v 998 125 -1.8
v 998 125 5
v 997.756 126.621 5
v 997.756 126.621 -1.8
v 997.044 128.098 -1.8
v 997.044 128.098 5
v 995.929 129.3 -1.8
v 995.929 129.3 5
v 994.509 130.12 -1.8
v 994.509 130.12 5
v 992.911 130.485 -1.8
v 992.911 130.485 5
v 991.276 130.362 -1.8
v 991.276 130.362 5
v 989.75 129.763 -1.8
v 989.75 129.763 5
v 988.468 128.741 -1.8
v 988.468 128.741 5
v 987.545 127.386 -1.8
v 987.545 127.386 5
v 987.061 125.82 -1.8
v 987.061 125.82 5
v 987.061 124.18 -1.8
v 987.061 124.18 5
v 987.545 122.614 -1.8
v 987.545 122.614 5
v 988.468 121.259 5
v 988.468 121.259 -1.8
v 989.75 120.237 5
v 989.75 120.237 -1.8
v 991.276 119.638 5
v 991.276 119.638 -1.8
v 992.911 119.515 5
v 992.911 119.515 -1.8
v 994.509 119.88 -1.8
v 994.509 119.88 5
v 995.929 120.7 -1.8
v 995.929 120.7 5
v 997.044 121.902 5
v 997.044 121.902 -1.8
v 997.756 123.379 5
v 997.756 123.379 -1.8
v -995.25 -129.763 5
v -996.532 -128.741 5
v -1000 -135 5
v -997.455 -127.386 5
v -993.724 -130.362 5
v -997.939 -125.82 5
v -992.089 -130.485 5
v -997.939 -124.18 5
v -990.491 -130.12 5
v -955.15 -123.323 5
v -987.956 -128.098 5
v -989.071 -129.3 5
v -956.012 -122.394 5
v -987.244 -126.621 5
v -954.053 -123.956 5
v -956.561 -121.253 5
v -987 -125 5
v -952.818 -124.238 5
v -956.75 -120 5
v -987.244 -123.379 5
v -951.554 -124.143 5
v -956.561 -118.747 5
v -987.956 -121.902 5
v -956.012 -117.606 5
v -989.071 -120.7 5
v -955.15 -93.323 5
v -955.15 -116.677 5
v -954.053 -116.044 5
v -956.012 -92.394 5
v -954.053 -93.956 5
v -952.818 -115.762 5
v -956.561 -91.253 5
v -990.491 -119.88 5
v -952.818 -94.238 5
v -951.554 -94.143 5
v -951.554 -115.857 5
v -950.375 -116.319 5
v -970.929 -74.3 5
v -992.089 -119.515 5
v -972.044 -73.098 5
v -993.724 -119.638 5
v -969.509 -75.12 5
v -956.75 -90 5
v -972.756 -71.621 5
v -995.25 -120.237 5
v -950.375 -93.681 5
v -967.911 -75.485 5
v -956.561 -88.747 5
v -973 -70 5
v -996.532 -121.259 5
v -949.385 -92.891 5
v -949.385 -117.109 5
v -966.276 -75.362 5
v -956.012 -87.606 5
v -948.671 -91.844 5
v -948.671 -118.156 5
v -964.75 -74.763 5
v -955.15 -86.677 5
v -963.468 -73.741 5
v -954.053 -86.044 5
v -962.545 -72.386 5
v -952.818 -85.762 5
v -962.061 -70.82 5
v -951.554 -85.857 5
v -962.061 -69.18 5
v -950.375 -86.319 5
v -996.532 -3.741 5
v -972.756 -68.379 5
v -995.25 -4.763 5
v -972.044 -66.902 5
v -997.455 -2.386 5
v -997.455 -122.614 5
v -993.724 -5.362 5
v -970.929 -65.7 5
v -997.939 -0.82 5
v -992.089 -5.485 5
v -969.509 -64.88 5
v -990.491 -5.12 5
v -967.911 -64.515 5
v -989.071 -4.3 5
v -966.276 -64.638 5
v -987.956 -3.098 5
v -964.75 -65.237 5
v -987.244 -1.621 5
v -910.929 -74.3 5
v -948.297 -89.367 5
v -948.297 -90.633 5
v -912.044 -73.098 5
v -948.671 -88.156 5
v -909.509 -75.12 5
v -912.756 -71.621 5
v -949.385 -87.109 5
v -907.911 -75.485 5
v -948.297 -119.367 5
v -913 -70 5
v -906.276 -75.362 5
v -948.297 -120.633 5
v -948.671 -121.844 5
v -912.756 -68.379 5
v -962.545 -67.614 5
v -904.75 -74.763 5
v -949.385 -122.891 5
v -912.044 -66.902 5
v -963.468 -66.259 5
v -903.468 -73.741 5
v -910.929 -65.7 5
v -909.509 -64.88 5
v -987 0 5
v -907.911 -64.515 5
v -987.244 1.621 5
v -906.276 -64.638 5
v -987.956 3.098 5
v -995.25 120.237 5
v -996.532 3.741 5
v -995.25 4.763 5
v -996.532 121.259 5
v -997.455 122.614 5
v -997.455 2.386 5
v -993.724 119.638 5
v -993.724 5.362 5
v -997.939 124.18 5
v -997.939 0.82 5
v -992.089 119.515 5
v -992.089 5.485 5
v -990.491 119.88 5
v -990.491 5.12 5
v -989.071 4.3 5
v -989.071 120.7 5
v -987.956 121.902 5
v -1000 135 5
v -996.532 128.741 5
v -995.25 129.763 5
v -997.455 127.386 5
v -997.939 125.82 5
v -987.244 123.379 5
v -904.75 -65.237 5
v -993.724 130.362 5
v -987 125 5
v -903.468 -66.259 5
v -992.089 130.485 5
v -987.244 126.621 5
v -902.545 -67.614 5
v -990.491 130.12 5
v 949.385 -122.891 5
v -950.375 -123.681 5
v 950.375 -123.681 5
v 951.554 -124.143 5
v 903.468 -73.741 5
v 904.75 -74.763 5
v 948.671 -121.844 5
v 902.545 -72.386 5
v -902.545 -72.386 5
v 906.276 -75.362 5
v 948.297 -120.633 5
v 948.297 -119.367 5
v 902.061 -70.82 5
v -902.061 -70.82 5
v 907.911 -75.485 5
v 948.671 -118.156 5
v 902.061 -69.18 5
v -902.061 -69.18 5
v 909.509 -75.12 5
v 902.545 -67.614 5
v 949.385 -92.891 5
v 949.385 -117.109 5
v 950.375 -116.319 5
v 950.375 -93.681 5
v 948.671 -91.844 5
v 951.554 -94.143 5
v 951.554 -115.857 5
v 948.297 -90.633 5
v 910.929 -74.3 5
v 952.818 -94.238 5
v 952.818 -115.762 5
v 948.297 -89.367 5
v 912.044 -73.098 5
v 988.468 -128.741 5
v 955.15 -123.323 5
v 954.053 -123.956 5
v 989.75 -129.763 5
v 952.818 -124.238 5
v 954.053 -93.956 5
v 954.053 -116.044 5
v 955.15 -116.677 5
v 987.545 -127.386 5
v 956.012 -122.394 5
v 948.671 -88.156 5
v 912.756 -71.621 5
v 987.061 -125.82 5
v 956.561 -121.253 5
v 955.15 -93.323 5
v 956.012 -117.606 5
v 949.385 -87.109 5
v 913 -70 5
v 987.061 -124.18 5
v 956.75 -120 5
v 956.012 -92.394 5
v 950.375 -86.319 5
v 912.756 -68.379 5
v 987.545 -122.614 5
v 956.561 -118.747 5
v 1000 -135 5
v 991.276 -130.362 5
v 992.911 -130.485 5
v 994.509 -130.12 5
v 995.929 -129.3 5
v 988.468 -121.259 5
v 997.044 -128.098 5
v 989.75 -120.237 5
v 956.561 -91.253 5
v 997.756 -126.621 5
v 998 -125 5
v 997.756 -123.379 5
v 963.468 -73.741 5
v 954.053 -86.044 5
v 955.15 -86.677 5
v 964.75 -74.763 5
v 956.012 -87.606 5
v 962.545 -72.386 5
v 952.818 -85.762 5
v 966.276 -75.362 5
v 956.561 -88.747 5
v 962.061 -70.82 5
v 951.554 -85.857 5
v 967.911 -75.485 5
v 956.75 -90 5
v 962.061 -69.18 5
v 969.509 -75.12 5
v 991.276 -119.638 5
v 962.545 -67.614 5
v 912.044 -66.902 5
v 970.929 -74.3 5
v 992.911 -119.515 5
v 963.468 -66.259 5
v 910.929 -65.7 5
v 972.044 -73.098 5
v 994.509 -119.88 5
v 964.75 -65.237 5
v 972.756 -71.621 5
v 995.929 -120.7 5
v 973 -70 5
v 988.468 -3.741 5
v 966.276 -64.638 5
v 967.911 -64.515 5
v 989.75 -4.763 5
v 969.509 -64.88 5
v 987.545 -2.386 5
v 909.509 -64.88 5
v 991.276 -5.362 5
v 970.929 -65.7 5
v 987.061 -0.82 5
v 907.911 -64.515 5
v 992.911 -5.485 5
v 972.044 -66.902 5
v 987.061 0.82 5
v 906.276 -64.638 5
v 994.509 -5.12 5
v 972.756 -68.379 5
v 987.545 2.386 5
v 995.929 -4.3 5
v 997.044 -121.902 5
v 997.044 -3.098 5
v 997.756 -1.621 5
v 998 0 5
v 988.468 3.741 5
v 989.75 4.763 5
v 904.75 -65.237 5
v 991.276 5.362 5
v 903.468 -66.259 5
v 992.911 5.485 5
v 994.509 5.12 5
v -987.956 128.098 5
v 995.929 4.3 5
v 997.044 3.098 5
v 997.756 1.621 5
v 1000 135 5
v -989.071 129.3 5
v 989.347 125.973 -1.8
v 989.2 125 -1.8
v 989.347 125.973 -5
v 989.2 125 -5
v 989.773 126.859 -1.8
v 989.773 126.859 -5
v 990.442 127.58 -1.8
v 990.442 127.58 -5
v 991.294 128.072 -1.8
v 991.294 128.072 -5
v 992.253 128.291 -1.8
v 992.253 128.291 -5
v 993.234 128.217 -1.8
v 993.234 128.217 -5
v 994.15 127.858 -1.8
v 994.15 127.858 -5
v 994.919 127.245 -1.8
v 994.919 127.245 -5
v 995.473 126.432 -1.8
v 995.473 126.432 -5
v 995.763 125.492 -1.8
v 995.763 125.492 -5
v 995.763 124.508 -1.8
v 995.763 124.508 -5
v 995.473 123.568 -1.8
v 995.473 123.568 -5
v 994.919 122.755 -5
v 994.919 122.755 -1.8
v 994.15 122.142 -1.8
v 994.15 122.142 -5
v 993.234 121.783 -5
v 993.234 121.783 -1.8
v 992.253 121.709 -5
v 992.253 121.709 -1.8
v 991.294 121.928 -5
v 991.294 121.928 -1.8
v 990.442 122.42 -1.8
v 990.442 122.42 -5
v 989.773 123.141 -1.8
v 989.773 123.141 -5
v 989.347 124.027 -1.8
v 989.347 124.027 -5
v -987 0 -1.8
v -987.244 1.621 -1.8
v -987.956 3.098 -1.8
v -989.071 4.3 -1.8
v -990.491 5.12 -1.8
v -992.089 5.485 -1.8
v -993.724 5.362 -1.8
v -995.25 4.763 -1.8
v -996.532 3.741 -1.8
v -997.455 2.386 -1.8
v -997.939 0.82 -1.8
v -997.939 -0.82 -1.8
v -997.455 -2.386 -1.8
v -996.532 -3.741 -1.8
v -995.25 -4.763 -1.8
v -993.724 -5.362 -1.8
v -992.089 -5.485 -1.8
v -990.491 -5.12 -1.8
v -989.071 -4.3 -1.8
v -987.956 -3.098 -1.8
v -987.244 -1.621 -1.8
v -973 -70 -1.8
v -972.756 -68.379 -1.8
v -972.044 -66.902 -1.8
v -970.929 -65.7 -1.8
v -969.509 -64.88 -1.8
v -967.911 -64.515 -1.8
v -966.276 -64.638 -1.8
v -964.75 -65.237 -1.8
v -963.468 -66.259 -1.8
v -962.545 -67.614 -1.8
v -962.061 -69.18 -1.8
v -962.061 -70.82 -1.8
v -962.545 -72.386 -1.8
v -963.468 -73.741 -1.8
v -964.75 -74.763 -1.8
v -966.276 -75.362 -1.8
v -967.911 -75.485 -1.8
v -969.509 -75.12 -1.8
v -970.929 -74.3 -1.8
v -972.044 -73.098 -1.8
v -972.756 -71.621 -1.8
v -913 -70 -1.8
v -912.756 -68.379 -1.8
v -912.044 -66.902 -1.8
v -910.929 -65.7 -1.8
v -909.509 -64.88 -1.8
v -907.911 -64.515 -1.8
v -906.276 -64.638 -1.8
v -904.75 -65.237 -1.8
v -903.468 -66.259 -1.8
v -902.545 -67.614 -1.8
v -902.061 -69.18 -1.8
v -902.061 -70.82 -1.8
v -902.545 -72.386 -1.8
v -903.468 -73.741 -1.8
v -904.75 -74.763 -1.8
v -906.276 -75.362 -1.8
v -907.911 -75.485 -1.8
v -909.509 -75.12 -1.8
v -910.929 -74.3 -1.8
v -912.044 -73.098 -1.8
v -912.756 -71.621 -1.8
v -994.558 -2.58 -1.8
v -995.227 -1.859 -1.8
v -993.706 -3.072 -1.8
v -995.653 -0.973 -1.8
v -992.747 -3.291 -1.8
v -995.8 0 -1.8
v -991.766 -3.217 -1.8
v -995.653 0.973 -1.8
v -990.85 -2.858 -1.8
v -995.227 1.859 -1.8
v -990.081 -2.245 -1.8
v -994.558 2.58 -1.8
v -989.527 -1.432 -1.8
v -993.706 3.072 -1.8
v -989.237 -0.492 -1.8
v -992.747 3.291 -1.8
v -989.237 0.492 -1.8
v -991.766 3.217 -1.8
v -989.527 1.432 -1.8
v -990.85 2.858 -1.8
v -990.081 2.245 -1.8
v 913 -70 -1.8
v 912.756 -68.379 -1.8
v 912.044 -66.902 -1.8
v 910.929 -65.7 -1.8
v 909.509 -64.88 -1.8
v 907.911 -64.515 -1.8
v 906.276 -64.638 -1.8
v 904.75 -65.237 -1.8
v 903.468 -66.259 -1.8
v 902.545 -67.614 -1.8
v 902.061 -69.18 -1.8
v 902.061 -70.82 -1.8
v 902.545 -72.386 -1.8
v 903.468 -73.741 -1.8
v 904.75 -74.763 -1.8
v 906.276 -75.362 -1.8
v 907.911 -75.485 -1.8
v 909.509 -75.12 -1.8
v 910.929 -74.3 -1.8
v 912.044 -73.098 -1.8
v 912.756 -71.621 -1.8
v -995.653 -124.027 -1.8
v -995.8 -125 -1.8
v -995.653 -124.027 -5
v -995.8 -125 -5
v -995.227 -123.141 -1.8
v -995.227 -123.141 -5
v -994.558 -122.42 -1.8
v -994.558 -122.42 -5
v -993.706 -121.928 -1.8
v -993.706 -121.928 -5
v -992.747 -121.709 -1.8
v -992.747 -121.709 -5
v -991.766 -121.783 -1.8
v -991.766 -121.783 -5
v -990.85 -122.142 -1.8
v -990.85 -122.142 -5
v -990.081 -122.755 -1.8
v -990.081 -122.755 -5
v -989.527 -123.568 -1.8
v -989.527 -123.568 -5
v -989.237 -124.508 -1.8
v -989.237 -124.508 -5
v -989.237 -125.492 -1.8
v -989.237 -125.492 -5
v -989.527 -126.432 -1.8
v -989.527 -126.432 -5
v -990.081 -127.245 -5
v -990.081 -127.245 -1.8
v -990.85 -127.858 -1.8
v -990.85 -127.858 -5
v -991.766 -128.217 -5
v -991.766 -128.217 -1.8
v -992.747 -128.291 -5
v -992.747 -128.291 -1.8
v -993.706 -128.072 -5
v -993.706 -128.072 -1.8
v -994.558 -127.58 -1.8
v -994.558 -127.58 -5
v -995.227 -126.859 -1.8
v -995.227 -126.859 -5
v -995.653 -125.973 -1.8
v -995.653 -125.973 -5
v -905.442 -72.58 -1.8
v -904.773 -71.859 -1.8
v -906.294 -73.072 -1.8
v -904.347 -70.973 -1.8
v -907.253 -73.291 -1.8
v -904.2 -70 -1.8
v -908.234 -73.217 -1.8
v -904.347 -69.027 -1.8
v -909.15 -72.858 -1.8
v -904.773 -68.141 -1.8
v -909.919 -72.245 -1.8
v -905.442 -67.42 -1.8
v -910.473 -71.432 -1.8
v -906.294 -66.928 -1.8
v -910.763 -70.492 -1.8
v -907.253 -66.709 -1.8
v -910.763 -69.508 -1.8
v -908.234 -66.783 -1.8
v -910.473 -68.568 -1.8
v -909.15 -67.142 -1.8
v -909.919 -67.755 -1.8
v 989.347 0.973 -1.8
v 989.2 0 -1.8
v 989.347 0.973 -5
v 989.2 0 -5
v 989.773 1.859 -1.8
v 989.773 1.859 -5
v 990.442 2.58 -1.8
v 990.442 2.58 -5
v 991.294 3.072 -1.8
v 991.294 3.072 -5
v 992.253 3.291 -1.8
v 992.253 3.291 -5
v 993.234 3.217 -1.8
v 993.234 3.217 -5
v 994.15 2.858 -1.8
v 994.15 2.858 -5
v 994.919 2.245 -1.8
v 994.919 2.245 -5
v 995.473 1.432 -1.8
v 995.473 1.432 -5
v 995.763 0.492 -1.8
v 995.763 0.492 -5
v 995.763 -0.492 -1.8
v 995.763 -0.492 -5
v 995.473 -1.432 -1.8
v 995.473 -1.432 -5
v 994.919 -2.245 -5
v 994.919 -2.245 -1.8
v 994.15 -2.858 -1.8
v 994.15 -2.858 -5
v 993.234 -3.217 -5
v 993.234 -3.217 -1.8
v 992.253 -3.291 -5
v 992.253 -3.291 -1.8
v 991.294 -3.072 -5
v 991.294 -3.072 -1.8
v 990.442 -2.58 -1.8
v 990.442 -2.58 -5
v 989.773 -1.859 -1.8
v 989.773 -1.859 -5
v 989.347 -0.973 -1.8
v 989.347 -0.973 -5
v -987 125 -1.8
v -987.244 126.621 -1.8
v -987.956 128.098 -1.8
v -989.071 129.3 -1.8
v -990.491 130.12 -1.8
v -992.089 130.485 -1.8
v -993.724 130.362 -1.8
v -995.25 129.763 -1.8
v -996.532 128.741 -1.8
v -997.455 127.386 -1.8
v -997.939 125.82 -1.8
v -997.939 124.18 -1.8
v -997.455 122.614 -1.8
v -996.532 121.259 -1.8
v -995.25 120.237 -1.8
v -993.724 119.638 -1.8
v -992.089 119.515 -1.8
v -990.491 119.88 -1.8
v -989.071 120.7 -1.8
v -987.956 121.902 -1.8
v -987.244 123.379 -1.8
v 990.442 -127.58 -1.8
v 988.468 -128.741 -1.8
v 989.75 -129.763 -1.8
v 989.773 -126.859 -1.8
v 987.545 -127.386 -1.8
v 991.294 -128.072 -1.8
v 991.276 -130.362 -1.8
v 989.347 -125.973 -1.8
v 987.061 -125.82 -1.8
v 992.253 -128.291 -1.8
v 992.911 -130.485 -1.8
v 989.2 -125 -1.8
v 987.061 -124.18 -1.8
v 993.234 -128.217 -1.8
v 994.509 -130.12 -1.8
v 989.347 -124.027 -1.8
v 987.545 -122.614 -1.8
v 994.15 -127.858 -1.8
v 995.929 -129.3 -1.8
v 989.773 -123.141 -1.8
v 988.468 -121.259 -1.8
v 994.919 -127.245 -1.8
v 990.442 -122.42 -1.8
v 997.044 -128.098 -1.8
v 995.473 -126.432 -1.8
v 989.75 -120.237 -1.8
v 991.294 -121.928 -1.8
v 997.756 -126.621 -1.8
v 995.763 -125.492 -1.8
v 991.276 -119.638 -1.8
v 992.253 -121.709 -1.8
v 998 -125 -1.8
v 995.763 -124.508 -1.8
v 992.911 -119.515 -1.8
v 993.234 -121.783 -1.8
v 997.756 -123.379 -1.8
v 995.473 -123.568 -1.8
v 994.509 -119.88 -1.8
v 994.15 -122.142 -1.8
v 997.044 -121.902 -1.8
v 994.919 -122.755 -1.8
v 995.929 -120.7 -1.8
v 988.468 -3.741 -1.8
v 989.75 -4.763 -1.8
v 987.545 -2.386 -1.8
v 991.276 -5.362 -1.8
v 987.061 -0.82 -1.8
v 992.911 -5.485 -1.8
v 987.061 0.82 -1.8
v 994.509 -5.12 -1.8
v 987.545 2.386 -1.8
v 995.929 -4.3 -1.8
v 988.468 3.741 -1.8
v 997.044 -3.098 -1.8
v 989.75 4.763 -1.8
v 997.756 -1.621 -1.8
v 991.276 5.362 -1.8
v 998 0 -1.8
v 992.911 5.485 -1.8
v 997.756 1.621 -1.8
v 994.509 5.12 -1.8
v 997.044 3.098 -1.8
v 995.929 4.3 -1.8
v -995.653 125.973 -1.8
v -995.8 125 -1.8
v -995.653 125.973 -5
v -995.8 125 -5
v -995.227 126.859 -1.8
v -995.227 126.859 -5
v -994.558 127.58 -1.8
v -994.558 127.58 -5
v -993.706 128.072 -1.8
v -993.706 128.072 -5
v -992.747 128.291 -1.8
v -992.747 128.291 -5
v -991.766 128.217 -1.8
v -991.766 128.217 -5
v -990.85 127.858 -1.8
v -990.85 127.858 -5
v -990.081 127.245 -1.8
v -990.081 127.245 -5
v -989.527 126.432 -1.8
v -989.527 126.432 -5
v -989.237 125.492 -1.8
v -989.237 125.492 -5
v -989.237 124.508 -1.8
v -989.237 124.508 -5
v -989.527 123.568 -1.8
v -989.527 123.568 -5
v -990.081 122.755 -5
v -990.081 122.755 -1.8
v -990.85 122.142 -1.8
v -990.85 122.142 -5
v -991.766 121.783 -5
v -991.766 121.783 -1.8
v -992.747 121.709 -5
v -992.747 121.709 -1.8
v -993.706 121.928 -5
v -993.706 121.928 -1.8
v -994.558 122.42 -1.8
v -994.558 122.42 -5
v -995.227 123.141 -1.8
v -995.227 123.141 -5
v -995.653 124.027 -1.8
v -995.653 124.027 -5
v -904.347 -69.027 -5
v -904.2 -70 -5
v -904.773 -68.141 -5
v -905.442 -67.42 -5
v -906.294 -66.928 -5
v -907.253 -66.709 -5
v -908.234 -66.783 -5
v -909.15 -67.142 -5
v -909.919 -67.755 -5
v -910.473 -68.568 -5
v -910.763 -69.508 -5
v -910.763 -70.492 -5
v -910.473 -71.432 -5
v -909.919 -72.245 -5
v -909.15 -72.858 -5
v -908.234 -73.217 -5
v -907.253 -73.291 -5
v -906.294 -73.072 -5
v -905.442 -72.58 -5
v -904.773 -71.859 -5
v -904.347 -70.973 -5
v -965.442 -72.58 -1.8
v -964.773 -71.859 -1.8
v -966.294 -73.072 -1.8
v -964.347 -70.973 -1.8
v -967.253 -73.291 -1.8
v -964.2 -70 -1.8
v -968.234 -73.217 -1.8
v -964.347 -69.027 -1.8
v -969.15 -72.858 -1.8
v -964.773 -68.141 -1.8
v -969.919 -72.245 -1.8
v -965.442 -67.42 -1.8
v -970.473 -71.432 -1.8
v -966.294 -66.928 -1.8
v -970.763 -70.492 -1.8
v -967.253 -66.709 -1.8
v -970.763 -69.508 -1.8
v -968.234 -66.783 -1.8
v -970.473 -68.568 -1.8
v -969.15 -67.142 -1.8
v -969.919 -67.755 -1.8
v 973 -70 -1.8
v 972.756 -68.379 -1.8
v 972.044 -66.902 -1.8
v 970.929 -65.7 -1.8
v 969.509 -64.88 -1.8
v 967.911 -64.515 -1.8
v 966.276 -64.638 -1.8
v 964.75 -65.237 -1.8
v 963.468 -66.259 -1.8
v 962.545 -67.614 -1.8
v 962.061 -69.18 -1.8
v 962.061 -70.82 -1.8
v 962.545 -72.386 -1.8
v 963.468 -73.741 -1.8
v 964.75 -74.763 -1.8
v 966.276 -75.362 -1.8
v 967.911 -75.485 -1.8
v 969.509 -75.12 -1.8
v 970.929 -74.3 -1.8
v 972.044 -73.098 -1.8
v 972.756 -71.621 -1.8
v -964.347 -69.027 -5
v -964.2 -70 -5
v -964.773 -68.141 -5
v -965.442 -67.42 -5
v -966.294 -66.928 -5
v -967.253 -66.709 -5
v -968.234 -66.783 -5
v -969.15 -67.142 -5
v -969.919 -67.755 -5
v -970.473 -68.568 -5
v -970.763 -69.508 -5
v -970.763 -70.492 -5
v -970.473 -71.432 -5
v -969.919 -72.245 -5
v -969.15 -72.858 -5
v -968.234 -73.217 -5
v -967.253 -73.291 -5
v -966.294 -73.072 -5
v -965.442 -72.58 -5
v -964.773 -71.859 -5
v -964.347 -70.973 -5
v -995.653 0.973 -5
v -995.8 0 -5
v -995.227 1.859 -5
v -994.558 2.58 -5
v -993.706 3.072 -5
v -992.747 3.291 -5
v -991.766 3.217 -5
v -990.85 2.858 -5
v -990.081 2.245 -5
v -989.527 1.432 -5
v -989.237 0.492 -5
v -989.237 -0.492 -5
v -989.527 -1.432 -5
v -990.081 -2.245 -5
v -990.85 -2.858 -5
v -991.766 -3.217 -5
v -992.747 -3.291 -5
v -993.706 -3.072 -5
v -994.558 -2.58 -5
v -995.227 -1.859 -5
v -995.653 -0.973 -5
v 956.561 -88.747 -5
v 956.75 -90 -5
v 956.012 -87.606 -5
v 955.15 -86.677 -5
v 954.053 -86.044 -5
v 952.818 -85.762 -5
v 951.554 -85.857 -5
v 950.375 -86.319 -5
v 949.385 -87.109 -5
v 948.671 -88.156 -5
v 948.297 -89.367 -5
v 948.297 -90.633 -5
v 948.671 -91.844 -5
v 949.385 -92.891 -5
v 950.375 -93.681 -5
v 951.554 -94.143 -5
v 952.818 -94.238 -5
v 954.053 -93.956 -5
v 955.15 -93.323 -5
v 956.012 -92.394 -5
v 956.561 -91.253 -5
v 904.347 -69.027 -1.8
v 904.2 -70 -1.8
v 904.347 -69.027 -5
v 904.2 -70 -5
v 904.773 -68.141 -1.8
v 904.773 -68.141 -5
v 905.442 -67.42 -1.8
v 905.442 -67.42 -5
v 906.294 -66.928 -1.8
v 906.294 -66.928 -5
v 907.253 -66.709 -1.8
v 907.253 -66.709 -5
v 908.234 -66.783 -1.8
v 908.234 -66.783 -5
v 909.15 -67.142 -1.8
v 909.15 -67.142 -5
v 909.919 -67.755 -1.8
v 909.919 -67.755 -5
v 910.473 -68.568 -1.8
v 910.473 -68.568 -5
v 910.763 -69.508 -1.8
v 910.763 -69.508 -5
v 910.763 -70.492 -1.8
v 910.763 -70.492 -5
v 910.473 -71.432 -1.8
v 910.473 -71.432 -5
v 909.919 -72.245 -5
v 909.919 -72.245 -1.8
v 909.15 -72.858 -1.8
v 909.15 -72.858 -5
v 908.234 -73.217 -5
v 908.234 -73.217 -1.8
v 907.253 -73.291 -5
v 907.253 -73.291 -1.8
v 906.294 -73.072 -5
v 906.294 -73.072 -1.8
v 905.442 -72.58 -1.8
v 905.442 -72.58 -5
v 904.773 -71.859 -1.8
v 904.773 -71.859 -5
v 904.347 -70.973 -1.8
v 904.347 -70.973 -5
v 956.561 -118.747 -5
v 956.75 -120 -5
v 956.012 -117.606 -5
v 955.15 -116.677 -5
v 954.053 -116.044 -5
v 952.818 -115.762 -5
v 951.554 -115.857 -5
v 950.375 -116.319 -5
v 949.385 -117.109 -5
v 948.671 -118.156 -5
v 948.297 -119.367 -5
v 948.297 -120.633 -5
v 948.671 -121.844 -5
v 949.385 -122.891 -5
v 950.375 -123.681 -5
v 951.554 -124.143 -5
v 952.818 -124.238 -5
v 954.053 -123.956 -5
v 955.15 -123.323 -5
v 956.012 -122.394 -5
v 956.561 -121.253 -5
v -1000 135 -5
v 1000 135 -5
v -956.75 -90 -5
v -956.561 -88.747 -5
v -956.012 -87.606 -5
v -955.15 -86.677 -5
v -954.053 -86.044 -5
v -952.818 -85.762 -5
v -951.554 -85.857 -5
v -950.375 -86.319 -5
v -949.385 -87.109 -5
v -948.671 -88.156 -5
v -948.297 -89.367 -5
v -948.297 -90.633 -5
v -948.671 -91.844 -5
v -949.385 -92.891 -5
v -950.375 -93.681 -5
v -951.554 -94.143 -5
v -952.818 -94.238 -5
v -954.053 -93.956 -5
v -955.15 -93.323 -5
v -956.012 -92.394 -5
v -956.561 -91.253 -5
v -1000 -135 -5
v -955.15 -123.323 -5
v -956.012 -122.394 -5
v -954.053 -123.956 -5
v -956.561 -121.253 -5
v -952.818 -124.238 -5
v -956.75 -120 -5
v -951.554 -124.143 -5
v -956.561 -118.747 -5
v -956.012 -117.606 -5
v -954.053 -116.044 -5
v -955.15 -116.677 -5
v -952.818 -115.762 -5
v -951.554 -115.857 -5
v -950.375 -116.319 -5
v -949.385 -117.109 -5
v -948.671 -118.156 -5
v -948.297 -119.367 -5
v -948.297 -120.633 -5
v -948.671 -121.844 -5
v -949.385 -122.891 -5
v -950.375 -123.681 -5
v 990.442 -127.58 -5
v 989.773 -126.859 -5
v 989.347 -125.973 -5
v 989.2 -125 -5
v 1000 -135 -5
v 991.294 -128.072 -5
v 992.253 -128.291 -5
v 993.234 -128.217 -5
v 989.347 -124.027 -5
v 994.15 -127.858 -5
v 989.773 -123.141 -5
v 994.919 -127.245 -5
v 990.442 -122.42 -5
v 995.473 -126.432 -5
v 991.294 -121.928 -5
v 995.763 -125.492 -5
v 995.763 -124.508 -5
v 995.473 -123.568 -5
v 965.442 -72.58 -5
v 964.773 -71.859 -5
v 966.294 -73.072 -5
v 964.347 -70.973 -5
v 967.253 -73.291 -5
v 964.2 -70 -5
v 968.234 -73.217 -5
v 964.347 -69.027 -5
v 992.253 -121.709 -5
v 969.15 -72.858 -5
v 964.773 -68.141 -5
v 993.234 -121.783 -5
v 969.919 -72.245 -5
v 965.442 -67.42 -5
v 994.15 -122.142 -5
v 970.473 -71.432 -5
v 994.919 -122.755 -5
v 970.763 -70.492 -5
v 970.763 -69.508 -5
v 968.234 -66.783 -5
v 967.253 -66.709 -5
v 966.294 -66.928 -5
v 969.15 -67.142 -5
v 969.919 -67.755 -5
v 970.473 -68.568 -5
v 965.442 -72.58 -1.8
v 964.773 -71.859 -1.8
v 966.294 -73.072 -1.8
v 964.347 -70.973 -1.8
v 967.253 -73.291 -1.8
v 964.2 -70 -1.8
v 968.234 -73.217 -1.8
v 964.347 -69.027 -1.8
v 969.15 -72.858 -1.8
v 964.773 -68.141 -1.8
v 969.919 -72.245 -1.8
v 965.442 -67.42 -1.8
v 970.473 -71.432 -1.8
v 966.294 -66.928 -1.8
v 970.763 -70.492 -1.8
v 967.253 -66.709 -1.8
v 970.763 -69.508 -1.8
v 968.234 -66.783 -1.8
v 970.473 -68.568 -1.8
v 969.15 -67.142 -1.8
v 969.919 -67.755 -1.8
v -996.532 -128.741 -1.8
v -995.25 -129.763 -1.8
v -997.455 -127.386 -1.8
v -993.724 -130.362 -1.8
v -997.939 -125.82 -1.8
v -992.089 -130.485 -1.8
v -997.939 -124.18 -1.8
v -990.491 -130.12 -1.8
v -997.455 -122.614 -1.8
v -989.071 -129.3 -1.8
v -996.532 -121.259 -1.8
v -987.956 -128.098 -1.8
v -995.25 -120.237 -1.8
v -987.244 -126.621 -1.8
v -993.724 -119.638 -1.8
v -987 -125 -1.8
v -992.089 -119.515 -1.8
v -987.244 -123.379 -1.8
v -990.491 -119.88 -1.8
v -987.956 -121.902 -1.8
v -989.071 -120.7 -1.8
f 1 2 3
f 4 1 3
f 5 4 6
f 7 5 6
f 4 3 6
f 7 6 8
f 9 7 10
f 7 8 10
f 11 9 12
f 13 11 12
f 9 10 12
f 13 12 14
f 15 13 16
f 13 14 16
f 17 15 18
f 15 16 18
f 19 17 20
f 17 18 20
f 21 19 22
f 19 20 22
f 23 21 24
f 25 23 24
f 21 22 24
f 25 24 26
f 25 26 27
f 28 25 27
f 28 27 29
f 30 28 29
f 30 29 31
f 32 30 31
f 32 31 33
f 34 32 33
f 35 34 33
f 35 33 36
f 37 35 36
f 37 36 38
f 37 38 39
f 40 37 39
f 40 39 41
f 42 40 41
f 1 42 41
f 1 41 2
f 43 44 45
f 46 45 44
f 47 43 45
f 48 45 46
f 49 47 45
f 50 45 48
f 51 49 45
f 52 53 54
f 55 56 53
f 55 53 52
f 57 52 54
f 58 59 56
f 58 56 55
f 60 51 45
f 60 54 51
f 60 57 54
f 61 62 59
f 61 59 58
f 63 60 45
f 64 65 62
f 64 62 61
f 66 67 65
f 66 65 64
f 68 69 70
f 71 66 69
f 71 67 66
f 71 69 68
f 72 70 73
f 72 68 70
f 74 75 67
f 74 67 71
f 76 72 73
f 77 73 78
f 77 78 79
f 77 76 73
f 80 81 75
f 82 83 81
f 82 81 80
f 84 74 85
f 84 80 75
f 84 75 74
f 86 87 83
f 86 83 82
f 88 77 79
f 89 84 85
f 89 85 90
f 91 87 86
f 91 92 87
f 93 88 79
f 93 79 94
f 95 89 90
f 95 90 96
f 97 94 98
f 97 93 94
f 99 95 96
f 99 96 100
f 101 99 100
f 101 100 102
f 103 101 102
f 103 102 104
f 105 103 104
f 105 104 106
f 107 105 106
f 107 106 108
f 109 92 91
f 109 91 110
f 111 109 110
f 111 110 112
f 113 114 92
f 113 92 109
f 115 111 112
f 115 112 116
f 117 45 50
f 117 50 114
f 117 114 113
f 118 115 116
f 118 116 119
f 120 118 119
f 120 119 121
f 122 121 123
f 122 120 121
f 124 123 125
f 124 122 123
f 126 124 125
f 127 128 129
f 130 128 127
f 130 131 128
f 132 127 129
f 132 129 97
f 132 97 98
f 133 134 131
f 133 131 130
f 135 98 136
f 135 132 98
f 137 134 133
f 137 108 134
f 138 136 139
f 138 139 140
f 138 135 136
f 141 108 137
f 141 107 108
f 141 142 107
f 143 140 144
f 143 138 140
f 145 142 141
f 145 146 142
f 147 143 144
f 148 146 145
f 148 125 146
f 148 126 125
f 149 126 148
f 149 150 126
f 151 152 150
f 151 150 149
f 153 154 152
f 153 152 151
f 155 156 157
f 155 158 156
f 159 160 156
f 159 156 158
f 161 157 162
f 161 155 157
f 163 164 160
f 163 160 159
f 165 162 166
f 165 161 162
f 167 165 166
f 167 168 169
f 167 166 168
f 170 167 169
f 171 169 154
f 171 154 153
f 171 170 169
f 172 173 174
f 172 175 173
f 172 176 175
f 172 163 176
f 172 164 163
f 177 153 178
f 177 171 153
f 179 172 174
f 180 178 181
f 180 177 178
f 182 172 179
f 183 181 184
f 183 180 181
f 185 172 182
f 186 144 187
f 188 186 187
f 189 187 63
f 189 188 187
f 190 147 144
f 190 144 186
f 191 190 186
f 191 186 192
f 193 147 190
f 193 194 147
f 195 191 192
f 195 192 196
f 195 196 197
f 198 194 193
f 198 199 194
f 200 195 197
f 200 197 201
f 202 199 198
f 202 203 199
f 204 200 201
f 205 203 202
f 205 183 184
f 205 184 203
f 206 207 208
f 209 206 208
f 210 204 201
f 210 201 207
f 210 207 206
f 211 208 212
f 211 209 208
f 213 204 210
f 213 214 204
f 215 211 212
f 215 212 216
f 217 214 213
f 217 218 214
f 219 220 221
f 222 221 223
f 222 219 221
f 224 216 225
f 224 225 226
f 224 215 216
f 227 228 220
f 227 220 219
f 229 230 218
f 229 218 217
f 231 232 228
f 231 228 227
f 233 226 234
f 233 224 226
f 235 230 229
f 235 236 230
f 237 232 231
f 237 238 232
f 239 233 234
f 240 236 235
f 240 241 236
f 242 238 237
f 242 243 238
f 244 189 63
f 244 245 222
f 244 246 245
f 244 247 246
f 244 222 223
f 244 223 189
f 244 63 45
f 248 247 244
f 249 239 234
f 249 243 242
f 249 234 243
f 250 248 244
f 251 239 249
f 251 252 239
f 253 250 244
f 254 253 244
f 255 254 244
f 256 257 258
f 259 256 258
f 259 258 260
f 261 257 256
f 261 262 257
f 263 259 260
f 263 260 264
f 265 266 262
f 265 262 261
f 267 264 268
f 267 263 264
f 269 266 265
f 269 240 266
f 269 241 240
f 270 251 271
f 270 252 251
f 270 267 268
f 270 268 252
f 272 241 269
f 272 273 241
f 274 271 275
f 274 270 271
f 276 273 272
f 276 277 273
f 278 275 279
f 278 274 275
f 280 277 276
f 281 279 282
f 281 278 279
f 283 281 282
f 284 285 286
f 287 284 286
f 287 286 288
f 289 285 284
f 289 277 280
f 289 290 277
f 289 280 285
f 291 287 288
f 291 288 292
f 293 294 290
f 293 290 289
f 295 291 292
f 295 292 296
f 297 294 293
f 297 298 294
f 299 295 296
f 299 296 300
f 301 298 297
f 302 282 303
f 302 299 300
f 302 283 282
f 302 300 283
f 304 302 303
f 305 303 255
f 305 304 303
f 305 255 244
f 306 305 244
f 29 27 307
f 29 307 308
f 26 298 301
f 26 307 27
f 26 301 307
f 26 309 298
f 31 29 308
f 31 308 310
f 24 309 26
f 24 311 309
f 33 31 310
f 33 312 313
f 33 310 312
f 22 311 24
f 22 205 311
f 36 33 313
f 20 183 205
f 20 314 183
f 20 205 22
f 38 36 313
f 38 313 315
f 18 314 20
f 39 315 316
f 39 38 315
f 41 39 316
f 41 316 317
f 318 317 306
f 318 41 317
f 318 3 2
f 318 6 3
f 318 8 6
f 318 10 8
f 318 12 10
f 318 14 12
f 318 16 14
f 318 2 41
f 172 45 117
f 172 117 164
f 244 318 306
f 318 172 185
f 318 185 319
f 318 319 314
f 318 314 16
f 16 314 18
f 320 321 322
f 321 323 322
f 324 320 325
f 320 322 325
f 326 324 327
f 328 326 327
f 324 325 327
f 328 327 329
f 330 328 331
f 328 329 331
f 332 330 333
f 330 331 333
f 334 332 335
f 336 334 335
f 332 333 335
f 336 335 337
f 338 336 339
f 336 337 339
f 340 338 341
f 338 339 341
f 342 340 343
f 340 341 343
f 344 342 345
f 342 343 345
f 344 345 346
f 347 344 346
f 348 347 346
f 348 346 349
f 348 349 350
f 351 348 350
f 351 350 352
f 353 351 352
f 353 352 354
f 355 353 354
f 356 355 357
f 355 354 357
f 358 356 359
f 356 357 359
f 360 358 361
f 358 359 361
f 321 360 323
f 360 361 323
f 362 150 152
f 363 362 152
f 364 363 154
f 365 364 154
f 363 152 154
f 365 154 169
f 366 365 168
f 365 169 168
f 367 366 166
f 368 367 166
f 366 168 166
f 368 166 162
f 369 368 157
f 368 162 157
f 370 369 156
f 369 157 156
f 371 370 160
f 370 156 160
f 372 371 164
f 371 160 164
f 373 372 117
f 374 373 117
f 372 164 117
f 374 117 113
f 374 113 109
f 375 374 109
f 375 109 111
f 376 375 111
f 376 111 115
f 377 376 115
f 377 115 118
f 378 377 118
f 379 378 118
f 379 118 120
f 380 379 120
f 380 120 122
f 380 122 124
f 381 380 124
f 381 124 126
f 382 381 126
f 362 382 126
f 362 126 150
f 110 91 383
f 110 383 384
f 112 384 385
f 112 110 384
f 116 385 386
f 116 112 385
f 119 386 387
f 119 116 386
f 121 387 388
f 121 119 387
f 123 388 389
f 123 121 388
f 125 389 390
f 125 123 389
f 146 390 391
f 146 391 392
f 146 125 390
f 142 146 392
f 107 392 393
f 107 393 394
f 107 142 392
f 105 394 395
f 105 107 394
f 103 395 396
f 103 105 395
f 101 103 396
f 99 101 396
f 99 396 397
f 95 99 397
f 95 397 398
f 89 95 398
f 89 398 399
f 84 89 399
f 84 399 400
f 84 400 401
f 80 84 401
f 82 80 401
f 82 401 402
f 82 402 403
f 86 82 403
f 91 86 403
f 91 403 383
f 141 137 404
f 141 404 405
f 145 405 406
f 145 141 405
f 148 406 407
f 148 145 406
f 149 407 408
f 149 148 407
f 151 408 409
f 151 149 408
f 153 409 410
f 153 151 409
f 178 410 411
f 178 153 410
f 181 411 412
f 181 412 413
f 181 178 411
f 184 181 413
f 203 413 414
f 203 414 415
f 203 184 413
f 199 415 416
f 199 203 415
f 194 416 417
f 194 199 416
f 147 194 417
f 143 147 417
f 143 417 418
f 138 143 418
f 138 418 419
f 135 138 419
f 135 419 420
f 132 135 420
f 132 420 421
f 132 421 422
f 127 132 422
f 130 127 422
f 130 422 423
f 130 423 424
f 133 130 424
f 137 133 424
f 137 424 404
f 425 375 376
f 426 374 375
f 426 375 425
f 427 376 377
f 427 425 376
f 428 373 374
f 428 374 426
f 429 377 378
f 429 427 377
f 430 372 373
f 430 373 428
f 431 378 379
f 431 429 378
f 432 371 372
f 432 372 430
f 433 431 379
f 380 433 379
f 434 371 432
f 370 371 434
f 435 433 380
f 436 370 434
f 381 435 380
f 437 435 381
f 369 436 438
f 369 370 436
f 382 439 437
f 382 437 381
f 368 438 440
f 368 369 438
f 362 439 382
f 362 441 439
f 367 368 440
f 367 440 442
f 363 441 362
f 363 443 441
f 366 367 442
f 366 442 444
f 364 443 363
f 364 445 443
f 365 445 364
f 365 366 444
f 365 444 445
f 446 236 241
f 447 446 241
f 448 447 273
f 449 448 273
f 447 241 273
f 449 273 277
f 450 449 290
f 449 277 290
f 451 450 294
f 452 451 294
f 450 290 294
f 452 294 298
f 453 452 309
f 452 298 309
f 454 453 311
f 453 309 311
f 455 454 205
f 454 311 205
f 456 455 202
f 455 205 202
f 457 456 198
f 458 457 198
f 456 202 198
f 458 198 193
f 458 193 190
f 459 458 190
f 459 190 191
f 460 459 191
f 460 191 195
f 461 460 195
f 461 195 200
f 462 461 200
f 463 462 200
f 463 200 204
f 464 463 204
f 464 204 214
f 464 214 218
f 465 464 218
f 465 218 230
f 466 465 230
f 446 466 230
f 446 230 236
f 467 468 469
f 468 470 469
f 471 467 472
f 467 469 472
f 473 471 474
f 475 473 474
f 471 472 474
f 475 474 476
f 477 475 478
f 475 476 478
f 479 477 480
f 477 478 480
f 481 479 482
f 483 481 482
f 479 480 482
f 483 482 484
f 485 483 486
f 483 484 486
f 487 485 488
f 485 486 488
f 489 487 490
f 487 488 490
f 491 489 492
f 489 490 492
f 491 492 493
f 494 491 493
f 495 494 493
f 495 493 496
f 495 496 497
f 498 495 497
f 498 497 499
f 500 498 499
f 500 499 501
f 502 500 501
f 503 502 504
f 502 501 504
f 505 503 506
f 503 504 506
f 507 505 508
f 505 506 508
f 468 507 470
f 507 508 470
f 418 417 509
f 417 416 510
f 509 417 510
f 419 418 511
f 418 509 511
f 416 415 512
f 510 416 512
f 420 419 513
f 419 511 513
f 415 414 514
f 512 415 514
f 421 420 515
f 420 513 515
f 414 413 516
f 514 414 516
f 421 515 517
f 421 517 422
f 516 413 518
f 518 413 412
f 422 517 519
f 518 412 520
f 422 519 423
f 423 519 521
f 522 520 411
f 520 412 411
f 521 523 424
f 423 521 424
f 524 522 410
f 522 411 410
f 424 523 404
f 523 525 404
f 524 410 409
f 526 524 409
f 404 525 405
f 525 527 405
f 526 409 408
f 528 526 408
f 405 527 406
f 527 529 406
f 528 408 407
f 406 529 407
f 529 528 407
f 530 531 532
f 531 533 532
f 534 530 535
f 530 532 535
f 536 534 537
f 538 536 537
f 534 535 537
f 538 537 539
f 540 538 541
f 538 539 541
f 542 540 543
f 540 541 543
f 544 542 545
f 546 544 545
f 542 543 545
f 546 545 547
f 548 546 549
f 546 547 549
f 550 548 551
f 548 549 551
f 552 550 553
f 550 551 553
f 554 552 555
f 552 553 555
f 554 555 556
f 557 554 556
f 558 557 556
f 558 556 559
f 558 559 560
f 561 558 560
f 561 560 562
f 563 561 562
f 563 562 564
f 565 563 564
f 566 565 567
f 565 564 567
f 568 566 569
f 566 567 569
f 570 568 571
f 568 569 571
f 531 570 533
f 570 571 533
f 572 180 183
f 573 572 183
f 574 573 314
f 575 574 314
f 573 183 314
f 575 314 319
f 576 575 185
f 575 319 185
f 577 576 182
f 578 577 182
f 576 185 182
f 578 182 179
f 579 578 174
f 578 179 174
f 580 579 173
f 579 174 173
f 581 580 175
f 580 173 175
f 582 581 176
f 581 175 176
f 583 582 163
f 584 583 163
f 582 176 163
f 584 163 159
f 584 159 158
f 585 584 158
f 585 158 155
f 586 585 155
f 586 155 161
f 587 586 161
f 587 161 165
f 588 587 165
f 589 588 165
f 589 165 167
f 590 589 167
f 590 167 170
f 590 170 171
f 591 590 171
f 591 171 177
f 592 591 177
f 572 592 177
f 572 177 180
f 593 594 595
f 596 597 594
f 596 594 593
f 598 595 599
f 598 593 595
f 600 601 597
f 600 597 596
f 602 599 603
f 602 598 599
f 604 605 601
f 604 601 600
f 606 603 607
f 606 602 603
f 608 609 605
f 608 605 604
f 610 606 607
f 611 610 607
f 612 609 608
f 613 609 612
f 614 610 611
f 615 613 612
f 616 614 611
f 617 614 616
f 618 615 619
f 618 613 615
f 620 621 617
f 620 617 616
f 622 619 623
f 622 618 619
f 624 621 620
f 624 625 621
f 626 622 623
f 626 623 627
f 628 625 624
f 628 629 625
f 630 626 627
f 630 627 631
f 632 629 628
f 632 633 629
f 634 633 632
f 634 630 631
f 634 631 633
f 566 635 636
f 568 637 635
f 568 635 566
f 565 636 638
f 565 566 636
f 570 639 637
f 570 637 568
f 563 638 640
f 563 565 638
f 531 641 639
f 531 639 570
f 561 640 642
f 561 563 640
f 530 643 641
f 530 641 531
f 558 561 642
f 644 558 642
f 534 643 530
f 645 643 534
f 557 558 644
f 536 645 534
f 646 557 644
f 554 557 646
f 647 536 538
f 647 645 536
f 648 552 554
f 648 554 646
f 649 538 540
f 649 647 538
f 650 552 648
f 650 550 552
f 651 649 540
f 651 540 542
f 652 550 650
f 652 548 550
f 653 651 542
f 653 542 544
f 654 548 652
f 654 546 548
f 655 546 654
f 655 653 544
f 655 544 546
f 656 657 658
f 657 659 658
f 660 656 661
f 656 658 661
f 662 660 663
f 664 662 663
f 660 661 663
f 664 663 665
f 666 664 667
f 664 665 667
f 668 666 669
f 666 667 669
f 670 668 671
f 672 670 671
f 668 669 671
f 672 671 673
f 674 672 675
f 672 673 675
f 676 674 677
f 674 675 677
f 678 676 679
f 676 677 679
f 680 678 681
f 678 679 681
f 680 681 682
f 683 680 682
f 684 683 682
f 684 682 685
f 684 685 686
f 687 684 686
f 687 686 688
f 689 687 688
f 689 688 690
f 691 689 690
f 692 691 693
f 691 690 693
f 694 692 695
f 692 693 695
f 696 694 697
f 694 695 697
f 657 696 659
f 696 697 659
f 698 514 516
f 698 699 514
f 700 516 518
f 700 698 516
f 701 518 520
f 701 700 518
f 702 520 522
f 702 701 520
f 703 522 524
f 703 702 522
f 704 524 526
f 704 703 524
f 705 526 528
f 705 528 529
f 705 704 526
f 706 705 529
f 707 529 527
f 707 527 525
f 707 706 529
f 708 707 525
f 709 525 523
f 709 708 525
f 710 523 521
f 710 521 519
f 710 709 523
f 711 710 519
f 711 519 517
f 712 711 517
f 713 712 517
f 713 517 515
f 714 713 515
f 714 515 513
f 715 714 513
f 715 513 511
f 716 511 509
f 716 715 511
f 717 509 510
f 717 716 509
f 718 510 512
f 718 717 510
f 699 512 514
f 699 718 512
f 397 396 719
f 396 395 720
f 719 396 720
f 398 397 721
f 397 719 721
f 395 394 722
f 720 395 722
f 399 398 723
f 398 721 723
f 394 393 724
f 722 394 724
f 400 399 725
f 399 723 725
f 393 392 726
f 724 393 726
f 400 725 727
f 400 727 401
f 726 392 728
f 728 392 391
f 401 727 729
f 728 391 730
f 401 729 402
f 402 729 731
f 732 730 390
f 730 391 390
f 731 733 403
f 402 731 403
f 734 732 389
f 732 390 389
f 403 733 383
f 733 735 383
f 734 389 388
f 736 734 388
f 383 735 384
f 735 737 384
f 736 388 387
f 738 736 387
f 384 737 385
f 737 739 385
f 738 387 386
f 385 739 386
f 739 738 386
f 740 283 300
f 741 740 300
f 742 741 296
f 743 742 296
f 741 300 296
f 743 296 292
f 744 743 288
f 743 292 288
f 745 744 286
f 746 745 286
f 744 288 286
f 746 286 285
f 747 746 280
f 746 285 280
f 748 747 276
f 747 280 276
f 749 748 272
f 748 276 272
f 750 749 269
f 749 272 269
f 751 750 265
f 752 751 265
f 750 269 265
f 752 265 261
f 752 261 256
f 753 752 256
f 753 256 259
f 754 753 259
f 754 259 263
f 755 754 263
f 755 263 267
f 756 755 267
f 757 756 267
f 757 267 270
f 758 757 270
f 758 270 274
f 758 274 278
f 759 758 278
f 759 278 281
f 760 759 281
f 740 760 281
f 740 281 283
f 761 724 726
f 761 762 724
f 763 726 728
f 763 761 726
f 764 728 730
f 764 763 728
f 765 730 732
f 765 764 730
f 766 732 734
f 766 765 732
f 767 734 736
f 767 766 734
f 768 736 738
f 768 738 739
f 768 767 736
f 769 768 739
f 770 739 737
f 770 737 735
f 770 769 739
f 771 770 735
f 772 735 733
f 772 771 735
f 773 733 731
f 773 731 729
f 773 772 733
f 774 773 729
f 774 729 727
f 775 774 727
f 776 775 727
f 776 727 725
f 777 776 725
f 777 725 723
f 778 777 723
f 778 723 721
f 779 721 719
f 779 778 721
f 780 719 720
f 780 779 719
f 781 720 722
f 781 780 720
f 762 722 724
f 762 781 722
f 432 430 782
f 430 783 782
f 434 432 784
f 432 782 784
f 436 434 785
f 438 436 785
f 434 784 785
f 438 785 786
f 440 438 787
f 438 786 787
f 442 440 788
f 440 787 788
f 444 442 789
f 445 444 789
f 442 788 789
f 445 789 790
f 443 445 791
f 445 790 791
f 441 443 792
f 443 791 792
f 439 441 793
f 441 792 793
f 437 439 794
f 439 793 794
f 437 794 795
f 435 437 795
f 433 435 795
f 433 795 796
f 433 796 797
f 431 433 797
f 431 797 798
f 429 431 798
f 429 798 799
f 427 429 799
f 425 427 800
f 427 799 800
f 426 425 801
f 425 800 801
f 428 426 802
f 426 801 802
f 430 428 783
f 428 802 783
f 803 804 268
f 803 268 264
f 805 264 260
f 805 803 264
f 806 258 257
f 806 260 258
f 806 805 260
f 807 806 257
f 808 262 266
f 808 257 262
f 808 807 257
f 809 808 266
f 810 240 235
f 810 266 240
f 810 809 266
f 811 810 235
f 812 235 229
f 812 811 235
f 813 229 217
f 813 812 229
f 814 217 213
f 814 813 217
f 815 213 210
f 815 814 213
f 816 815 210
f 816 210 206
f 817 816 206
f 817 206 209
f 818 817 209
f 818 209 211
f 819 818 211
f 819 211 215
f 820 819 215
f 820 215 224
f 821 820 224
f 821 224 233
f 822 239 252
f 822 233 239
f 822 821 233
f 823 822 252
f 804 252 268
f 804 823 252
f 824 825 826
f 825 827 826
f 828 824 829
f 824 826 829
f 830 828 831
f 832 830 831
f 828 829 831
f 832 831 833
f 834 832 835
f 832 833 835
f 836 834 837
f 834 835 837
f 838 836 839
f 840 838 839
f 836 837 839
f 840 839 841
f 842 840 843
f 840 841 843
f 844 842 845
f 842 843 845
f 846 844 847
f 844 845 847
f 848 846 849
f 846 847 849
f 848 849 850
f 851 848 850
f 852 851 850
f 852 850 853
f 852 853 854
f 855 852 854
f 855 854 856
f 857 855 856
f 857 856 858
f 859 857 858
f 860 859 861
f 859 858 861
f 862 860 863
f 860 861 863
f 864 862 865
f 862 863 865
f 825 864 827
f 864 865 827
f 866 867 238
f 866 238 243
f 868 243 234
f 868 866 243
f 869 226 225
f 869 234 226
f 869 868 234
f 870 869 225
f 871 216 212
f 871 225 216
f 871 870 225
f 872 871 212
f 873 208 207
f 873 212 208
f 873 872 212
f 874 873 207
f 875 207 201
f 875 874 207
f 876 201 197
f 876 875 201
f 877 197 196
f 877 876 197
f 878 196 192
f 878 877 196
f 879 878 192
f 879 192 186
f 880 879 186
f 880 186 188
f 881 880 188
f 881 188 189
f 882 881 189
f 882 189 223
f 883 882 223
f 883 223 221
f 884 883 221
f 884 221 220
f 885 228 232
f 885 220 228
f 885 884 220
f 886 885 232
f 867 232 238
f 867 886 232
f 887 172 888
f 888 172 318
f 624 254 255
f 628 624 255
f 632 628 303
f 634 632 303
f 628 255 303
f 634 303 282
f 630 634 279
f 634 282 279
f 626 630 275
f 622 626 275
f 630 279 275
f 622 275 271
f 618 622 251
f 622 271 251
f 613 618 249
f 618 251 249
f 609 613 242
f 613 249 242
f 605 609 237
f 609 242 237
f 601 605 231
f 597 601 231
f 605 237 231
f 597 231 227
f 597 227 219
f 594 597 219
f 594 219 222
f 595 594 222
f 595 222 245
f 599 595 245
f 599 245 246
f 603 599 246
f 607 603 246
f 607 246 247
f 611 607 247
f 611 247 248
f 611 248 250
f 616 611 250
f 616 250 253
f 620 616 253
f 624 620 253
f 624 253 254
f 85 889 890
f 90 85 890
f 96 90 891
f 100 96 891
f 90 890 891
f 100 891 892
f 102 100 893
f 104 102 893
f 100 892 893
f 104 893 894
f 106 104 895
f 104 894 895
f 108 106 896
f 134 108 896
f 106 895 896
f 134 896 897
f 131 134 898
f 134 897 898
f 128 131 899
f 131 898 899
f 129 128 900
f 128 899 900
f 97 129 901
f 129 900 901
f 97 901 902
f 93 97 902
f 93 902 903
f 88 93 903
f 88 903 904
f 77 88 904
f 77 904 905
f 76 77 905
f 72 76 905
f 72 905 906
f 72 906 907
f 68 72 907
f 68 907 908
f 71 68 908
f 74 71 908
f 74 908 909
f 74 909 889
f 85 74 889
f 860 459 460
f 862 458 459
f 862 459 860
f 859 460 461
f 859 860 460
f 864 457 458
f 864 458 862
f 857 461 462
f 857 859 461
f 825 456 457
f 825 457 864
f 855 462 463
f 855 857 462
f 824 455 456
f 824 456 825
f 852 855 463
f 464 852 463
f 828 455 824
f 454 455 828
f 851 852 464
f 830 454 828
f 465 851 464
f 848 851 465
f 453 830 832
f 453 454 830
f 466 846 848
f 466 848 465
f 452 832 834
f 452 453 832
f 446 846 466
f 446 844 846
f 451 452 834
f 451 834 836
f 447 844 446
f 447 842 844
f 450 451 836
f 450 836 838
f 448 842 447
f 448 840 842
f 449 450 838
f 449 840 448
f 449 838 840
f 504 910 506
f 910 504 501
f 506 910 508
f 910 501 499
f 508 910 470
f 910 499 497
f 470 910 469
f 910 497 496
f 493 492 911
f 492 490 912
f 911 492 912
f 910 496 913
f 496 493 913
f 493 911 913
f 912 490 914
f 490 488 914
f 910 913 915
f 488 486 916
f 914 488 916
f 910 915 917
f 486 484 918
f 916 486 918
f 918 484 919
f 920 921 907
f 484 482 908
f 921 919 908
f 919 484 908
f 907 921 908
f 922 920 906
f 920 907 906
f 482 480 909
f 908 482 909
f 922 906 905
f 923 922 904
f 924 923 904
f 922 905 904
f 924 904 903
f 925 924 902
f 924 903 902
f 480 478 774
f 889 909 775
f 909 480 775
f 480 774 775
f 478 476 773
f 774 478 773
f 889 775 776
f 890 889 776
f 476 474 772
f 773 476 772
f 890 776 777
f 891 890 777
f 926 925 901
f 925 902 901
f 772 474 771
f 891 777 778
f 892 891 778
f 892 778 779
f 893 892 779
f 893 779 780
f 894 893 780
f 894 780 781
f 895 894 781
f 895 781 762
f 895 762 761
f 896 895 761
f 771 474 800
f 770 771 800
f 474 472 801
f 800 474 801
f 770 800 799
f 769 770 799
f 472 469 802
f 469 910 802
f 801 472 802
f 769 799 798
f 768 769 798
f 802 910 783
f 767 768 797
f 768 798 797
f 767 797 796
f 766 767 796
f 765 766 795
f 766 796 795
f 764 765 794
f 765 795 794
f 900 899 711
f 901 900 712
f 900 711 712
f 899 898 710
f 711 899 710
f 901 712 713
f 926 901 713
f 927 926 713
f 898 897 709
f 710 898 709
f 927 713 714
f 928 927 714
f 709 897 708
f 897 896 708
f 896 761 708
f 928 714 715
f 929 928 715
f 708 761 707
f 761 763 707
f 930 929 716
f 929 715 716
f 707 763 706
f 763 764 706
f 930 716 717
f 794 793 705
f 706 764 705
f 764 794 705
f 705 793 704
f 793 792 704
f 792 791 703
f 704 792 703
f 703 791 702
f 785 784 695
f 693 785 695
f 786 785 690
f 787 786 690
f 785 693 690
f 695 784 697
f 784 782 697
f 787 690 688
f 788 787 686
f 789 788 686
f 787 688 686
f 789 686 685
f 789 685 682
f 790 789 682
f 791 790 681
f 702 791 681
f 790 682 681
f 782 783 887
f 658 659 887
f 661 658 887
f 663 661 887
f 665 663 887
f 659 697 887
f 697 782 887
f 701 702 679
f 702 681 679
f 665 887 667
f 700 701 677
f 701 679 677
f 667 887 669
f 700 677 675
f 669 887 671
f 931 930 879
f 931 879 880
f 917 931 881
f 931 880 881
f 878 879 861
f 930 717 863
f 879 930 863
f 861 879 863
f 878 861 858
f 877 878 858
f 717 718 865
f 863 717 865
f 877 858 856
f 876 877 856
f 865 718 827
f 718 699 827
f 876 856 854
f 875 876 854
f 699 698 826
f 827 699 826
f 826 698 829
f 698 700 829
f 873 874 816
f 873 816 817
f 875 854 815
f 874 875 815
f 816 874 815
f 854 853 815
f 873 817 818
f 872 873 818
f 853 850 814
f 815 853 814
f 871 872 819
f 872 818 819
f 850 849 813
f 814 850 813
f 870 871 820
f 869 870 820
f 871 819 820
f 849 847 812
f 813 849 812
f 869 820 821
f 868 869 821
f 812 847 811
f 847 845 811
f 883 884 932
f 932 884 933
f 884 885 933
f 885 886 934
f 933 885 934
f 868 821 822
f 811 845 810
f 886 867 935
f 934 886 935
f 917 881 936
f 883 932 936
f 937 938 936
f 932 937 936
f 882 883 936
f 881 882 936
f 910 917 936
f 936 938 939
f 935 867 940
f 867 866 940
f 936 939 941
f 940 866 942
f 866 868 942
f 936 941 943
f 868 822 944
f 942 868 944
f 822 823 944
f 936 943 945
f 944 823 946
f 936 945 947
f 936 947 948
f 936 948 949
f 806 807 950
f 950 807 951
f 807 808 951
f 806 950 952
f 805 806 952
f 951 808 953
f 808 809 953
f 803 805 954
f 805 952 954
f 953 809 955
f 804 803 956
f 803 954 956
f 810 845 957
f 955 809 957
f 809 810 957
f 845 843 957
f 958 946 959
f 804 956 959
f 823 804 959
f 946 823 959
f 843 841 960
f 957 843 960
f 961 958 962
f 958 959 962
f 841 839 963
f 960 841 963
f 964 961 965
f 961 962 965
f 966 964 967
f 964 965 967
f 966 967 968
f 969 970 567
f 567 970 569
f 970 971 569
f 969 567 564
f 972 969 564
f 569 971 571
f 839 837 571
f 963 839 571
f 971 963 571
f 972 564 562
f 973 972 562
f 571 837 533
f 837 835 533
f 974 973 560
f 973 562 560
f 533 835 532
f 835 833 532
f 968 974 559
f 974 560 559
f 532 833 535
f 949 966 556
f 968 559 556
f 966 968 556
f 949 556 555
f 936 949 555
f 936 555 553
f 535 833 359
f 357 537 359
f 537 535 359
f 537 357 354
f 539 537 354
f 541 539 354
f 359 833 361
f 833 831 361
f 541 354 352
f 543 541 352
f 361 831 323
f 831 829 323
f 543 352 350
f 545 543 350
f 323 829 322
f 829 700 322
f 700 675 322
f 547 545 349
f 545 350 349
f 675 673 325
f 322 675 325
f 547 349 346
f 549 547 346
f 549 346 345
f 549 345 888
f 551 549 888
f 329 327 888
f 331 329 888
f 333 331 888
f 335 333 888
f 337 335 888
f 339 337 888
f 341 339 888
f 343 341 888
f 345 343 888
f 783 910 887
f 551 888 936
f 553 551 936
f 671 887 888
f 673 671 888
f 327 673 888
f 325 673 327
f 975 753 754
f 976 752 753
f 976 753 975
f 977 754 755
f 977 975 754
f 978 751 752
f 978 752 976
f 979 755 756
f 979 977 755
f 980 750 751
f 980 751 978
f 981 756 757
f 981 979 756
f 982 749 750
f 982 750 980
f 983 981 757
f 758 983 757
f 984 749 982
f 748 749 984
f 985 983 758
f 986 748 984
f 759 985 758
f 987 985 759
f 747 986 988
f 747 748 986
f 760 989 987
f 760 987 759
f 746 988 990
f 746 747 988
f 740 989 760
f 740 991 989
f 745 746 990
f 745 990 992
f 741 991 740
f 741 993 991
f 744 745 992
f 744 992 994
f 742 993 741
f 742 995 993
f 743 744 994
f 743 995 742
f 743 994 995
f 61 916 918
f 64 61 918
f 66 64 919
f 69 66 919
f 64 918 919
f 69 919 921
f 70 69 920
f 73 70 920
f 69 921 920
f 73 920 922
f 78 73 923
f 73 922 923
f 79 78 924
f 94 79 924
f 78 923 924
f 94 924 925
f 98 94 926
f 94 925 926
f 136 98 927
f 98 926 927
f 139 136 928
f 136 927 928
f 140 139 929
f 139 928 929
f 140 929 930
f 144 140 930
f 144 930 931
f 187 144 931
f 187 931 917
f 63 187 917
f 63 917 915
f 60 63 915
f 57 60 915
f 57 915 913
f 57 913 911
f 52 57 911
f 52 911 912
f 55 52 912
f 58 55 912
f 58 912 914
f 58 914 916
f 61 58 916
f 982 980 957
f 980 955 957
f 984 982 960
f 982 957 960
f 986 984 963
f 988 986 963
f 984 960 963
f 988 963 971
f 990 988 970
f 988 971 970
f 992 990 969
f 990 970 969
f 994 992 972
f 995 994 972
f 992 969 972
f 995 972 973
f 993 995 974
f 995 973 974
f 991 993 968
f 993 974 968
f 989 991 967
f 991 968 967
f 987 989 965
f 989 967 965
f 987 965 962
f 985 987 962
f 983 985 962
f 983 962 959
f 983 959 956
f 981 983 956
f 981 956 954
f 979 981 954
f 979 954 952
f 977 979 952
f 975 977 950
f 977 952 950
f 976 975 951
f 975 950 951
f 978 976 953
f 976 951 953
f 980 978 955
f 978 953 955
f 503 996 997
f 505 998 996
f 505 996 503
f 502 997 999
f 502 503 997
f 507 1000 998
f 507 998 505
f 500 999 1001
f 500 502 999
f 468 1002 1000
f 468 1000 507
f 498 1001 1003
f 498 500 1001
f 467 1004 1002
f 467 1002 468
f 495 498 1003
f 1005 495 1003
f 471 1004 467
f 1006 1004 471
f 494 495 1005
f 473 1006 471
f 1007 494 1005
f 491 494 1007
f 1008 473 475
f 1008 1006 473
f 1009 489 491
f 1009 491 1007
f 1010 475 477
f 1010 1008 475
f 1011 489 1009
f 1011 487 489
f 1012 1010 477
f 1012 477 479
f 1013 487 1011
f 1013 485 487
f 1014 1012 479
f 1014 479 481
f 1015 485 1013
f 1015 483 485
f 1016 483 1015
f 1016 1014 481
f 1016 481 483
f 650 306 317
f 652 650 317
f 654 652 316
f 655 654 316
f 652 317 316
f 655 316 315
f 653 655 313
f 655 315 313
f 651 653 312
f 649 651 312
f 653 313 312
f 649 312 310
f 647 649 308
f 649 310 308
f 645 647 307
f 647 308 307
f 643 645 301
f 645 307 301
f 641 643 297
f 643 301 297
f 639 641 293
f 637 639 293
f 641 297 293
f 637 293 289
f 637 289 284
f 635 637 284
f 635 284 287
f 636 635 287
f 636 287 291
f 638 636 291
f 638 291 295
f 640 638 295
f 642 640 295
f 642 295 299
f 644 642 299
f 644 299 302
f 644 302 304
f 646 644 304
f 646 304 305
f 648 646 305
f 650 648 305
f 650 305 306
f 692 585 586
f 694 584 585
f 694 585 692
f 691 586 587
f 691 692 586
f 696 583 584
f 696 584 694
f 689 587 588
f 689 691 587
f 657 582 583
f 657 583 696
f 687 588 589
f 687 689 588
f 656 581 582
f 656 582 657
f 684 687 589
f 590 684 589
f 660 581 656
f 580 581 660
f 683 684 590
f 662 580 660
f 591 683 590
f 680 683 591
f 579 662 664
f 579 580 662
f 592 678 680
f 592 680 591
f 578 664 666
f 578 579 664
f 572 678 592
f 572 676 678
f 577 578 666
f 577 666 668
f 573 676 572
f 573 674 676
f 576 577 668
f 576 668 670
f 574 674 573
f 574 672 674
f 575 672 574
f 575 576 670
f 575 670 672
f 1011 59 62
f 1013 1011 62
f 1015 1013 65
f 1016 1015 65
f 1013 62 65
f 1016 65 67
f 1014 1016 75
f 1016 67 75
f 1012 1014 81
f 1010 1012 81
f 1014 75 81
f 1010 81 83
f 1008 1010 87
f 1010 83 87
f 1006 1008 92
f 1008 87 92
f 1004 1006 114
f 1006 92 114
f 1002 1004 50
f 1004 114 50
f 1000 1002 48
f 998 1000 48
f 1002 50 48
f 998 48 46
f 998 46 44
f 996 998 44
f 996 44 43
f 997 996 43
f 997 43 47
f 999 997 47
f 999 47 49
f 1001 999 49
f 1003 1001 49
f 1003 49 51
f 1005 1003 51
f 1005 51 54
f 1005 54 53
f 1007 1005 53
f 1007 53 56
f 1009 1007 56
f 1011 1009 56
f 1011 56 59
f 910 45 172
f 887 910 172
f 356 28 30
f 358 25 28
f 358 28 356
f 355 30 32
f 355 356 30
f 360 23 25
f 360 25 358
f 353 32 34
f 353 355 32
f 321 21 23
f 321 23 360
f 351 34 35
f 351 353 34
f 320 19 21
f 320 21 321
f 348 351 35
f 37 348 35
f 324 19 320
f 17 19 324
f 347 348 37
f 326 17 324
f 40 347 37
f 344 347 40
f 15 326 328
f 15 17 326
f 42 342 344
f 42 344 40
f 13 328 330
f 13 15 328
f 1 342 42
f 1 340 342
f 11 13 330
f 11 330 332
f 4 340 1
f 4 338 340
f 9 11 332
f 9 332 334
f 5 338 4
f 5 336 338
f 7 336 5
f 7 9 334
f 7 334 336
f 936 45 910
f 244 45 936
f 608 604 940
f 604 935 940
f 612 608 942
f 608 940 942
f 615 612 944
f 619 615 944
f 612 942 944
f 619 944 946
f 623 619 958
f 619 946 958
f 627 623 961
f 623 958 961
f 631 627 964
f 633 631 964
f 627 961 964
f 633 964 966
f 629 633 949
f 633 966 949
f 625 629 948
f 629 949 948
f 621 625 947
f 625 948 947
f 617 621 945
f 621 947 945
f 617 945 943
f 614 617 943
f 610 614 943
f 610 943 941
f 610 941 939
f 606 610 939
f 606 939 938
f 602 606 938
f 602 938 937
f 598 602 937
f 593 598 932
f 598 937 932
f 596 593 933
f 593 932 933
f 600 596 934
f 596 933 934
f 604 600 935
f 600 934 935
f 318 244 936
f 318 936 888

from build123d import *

# Parameters (mm, degrees)
SKETCH_1_W                = 2000
SKETCH_1_H                = 270
EXTRUDE_1_DEPTH           = 5
HOLE_WIZARD_1_D           = 6.6
HOLE_WIZARD_1_CBORE_D     = 11
HOLE_WIZARD_1_CBORE_DEPTH = 6.8
HOLE_WIZARD_M10_1_D       = 8.5
HOLE_WIZARD_2_D           = 6.6
HOLE_WIZARD_2_CBORE_D     = 11
HOLE_WIZARD_2_CBORE_DEPTH = 6.8


with BuildPart() as part:
    # 草图1 → 凸台-拉伸1 (new body, symmetric)
    with BuildSketch(Plane.XY):
        Rectangle(SKETCH_1_W, SKETCH_1_H)
    extrude(amount=EXTRUDE_1_DEPTH, both=True)

    # 打孔尺寸(%根据)内六角圆柱头螺钉的类型1 (through all)
    with Locations(Plane(origin=(-992.5, 125, 5), x_dir=(1, 0, 0), z_dir=(0, 0, 1))):
        with Locations((0, 0), (0, -250), (1985, 0), (1985, -250), (1985, -125), (0, -125)):
            CounterBoreHole(HOLE_WIZARD_1_D / 2, HOLE_WIZARD_1_CBORE_D / 2, HOLE_WIZARD_1_CBORE_DEPTH)

    # M10 螺纹孔1 (through all)
    with Locations(Plane(origin=(-952.5, -90, 5), x_dir=(1, 0, 0), z_dir=(0, 0, 1))):
        with Locations((0, 0), (0, -30)):
            hole_wizard_m10_1 = Hole(HOLE_WIZARD_M10_1_D / 2)

    # 镜向1: M10 螺纹孔1 across plane
    add(hole_wizard_m10_1.mirror(Plane(origin=(0, 0, 0), x_dir=(0, 0, 1), z_dir=(1, 0, 0))), mode=Mode.SUBTRACT)

    # 打孔尺寸(%根据)内六角圆柱头螺钉的类型2 (through all)
    with Locations(Plane(origin=(907.5, -70, 5), x_dir=(1, 0, 0), z_dir=(0, 0, 1))):
        with Locations((0, 0), (60, 0)):
            hole_wizard_2 = CounterBoreHole(HOLE_WIZARD_2_D / 2, HOLE_WIZARD_2_CBORE_D / 2, HOLE_WIZARD_2_CBORE_DEPTH)

    # 镜向2: 打孔尺寸(%根据)内六角圆柱头螺钉的类型2 across plane
    add(hole_wizard_2.mirror(Plane(origin=(0, 0, 0), x_dir=(0, 0, 1), z_dir=(1, 0, 0))), mode=Mode.SUBTRACT)


solid = part.part
